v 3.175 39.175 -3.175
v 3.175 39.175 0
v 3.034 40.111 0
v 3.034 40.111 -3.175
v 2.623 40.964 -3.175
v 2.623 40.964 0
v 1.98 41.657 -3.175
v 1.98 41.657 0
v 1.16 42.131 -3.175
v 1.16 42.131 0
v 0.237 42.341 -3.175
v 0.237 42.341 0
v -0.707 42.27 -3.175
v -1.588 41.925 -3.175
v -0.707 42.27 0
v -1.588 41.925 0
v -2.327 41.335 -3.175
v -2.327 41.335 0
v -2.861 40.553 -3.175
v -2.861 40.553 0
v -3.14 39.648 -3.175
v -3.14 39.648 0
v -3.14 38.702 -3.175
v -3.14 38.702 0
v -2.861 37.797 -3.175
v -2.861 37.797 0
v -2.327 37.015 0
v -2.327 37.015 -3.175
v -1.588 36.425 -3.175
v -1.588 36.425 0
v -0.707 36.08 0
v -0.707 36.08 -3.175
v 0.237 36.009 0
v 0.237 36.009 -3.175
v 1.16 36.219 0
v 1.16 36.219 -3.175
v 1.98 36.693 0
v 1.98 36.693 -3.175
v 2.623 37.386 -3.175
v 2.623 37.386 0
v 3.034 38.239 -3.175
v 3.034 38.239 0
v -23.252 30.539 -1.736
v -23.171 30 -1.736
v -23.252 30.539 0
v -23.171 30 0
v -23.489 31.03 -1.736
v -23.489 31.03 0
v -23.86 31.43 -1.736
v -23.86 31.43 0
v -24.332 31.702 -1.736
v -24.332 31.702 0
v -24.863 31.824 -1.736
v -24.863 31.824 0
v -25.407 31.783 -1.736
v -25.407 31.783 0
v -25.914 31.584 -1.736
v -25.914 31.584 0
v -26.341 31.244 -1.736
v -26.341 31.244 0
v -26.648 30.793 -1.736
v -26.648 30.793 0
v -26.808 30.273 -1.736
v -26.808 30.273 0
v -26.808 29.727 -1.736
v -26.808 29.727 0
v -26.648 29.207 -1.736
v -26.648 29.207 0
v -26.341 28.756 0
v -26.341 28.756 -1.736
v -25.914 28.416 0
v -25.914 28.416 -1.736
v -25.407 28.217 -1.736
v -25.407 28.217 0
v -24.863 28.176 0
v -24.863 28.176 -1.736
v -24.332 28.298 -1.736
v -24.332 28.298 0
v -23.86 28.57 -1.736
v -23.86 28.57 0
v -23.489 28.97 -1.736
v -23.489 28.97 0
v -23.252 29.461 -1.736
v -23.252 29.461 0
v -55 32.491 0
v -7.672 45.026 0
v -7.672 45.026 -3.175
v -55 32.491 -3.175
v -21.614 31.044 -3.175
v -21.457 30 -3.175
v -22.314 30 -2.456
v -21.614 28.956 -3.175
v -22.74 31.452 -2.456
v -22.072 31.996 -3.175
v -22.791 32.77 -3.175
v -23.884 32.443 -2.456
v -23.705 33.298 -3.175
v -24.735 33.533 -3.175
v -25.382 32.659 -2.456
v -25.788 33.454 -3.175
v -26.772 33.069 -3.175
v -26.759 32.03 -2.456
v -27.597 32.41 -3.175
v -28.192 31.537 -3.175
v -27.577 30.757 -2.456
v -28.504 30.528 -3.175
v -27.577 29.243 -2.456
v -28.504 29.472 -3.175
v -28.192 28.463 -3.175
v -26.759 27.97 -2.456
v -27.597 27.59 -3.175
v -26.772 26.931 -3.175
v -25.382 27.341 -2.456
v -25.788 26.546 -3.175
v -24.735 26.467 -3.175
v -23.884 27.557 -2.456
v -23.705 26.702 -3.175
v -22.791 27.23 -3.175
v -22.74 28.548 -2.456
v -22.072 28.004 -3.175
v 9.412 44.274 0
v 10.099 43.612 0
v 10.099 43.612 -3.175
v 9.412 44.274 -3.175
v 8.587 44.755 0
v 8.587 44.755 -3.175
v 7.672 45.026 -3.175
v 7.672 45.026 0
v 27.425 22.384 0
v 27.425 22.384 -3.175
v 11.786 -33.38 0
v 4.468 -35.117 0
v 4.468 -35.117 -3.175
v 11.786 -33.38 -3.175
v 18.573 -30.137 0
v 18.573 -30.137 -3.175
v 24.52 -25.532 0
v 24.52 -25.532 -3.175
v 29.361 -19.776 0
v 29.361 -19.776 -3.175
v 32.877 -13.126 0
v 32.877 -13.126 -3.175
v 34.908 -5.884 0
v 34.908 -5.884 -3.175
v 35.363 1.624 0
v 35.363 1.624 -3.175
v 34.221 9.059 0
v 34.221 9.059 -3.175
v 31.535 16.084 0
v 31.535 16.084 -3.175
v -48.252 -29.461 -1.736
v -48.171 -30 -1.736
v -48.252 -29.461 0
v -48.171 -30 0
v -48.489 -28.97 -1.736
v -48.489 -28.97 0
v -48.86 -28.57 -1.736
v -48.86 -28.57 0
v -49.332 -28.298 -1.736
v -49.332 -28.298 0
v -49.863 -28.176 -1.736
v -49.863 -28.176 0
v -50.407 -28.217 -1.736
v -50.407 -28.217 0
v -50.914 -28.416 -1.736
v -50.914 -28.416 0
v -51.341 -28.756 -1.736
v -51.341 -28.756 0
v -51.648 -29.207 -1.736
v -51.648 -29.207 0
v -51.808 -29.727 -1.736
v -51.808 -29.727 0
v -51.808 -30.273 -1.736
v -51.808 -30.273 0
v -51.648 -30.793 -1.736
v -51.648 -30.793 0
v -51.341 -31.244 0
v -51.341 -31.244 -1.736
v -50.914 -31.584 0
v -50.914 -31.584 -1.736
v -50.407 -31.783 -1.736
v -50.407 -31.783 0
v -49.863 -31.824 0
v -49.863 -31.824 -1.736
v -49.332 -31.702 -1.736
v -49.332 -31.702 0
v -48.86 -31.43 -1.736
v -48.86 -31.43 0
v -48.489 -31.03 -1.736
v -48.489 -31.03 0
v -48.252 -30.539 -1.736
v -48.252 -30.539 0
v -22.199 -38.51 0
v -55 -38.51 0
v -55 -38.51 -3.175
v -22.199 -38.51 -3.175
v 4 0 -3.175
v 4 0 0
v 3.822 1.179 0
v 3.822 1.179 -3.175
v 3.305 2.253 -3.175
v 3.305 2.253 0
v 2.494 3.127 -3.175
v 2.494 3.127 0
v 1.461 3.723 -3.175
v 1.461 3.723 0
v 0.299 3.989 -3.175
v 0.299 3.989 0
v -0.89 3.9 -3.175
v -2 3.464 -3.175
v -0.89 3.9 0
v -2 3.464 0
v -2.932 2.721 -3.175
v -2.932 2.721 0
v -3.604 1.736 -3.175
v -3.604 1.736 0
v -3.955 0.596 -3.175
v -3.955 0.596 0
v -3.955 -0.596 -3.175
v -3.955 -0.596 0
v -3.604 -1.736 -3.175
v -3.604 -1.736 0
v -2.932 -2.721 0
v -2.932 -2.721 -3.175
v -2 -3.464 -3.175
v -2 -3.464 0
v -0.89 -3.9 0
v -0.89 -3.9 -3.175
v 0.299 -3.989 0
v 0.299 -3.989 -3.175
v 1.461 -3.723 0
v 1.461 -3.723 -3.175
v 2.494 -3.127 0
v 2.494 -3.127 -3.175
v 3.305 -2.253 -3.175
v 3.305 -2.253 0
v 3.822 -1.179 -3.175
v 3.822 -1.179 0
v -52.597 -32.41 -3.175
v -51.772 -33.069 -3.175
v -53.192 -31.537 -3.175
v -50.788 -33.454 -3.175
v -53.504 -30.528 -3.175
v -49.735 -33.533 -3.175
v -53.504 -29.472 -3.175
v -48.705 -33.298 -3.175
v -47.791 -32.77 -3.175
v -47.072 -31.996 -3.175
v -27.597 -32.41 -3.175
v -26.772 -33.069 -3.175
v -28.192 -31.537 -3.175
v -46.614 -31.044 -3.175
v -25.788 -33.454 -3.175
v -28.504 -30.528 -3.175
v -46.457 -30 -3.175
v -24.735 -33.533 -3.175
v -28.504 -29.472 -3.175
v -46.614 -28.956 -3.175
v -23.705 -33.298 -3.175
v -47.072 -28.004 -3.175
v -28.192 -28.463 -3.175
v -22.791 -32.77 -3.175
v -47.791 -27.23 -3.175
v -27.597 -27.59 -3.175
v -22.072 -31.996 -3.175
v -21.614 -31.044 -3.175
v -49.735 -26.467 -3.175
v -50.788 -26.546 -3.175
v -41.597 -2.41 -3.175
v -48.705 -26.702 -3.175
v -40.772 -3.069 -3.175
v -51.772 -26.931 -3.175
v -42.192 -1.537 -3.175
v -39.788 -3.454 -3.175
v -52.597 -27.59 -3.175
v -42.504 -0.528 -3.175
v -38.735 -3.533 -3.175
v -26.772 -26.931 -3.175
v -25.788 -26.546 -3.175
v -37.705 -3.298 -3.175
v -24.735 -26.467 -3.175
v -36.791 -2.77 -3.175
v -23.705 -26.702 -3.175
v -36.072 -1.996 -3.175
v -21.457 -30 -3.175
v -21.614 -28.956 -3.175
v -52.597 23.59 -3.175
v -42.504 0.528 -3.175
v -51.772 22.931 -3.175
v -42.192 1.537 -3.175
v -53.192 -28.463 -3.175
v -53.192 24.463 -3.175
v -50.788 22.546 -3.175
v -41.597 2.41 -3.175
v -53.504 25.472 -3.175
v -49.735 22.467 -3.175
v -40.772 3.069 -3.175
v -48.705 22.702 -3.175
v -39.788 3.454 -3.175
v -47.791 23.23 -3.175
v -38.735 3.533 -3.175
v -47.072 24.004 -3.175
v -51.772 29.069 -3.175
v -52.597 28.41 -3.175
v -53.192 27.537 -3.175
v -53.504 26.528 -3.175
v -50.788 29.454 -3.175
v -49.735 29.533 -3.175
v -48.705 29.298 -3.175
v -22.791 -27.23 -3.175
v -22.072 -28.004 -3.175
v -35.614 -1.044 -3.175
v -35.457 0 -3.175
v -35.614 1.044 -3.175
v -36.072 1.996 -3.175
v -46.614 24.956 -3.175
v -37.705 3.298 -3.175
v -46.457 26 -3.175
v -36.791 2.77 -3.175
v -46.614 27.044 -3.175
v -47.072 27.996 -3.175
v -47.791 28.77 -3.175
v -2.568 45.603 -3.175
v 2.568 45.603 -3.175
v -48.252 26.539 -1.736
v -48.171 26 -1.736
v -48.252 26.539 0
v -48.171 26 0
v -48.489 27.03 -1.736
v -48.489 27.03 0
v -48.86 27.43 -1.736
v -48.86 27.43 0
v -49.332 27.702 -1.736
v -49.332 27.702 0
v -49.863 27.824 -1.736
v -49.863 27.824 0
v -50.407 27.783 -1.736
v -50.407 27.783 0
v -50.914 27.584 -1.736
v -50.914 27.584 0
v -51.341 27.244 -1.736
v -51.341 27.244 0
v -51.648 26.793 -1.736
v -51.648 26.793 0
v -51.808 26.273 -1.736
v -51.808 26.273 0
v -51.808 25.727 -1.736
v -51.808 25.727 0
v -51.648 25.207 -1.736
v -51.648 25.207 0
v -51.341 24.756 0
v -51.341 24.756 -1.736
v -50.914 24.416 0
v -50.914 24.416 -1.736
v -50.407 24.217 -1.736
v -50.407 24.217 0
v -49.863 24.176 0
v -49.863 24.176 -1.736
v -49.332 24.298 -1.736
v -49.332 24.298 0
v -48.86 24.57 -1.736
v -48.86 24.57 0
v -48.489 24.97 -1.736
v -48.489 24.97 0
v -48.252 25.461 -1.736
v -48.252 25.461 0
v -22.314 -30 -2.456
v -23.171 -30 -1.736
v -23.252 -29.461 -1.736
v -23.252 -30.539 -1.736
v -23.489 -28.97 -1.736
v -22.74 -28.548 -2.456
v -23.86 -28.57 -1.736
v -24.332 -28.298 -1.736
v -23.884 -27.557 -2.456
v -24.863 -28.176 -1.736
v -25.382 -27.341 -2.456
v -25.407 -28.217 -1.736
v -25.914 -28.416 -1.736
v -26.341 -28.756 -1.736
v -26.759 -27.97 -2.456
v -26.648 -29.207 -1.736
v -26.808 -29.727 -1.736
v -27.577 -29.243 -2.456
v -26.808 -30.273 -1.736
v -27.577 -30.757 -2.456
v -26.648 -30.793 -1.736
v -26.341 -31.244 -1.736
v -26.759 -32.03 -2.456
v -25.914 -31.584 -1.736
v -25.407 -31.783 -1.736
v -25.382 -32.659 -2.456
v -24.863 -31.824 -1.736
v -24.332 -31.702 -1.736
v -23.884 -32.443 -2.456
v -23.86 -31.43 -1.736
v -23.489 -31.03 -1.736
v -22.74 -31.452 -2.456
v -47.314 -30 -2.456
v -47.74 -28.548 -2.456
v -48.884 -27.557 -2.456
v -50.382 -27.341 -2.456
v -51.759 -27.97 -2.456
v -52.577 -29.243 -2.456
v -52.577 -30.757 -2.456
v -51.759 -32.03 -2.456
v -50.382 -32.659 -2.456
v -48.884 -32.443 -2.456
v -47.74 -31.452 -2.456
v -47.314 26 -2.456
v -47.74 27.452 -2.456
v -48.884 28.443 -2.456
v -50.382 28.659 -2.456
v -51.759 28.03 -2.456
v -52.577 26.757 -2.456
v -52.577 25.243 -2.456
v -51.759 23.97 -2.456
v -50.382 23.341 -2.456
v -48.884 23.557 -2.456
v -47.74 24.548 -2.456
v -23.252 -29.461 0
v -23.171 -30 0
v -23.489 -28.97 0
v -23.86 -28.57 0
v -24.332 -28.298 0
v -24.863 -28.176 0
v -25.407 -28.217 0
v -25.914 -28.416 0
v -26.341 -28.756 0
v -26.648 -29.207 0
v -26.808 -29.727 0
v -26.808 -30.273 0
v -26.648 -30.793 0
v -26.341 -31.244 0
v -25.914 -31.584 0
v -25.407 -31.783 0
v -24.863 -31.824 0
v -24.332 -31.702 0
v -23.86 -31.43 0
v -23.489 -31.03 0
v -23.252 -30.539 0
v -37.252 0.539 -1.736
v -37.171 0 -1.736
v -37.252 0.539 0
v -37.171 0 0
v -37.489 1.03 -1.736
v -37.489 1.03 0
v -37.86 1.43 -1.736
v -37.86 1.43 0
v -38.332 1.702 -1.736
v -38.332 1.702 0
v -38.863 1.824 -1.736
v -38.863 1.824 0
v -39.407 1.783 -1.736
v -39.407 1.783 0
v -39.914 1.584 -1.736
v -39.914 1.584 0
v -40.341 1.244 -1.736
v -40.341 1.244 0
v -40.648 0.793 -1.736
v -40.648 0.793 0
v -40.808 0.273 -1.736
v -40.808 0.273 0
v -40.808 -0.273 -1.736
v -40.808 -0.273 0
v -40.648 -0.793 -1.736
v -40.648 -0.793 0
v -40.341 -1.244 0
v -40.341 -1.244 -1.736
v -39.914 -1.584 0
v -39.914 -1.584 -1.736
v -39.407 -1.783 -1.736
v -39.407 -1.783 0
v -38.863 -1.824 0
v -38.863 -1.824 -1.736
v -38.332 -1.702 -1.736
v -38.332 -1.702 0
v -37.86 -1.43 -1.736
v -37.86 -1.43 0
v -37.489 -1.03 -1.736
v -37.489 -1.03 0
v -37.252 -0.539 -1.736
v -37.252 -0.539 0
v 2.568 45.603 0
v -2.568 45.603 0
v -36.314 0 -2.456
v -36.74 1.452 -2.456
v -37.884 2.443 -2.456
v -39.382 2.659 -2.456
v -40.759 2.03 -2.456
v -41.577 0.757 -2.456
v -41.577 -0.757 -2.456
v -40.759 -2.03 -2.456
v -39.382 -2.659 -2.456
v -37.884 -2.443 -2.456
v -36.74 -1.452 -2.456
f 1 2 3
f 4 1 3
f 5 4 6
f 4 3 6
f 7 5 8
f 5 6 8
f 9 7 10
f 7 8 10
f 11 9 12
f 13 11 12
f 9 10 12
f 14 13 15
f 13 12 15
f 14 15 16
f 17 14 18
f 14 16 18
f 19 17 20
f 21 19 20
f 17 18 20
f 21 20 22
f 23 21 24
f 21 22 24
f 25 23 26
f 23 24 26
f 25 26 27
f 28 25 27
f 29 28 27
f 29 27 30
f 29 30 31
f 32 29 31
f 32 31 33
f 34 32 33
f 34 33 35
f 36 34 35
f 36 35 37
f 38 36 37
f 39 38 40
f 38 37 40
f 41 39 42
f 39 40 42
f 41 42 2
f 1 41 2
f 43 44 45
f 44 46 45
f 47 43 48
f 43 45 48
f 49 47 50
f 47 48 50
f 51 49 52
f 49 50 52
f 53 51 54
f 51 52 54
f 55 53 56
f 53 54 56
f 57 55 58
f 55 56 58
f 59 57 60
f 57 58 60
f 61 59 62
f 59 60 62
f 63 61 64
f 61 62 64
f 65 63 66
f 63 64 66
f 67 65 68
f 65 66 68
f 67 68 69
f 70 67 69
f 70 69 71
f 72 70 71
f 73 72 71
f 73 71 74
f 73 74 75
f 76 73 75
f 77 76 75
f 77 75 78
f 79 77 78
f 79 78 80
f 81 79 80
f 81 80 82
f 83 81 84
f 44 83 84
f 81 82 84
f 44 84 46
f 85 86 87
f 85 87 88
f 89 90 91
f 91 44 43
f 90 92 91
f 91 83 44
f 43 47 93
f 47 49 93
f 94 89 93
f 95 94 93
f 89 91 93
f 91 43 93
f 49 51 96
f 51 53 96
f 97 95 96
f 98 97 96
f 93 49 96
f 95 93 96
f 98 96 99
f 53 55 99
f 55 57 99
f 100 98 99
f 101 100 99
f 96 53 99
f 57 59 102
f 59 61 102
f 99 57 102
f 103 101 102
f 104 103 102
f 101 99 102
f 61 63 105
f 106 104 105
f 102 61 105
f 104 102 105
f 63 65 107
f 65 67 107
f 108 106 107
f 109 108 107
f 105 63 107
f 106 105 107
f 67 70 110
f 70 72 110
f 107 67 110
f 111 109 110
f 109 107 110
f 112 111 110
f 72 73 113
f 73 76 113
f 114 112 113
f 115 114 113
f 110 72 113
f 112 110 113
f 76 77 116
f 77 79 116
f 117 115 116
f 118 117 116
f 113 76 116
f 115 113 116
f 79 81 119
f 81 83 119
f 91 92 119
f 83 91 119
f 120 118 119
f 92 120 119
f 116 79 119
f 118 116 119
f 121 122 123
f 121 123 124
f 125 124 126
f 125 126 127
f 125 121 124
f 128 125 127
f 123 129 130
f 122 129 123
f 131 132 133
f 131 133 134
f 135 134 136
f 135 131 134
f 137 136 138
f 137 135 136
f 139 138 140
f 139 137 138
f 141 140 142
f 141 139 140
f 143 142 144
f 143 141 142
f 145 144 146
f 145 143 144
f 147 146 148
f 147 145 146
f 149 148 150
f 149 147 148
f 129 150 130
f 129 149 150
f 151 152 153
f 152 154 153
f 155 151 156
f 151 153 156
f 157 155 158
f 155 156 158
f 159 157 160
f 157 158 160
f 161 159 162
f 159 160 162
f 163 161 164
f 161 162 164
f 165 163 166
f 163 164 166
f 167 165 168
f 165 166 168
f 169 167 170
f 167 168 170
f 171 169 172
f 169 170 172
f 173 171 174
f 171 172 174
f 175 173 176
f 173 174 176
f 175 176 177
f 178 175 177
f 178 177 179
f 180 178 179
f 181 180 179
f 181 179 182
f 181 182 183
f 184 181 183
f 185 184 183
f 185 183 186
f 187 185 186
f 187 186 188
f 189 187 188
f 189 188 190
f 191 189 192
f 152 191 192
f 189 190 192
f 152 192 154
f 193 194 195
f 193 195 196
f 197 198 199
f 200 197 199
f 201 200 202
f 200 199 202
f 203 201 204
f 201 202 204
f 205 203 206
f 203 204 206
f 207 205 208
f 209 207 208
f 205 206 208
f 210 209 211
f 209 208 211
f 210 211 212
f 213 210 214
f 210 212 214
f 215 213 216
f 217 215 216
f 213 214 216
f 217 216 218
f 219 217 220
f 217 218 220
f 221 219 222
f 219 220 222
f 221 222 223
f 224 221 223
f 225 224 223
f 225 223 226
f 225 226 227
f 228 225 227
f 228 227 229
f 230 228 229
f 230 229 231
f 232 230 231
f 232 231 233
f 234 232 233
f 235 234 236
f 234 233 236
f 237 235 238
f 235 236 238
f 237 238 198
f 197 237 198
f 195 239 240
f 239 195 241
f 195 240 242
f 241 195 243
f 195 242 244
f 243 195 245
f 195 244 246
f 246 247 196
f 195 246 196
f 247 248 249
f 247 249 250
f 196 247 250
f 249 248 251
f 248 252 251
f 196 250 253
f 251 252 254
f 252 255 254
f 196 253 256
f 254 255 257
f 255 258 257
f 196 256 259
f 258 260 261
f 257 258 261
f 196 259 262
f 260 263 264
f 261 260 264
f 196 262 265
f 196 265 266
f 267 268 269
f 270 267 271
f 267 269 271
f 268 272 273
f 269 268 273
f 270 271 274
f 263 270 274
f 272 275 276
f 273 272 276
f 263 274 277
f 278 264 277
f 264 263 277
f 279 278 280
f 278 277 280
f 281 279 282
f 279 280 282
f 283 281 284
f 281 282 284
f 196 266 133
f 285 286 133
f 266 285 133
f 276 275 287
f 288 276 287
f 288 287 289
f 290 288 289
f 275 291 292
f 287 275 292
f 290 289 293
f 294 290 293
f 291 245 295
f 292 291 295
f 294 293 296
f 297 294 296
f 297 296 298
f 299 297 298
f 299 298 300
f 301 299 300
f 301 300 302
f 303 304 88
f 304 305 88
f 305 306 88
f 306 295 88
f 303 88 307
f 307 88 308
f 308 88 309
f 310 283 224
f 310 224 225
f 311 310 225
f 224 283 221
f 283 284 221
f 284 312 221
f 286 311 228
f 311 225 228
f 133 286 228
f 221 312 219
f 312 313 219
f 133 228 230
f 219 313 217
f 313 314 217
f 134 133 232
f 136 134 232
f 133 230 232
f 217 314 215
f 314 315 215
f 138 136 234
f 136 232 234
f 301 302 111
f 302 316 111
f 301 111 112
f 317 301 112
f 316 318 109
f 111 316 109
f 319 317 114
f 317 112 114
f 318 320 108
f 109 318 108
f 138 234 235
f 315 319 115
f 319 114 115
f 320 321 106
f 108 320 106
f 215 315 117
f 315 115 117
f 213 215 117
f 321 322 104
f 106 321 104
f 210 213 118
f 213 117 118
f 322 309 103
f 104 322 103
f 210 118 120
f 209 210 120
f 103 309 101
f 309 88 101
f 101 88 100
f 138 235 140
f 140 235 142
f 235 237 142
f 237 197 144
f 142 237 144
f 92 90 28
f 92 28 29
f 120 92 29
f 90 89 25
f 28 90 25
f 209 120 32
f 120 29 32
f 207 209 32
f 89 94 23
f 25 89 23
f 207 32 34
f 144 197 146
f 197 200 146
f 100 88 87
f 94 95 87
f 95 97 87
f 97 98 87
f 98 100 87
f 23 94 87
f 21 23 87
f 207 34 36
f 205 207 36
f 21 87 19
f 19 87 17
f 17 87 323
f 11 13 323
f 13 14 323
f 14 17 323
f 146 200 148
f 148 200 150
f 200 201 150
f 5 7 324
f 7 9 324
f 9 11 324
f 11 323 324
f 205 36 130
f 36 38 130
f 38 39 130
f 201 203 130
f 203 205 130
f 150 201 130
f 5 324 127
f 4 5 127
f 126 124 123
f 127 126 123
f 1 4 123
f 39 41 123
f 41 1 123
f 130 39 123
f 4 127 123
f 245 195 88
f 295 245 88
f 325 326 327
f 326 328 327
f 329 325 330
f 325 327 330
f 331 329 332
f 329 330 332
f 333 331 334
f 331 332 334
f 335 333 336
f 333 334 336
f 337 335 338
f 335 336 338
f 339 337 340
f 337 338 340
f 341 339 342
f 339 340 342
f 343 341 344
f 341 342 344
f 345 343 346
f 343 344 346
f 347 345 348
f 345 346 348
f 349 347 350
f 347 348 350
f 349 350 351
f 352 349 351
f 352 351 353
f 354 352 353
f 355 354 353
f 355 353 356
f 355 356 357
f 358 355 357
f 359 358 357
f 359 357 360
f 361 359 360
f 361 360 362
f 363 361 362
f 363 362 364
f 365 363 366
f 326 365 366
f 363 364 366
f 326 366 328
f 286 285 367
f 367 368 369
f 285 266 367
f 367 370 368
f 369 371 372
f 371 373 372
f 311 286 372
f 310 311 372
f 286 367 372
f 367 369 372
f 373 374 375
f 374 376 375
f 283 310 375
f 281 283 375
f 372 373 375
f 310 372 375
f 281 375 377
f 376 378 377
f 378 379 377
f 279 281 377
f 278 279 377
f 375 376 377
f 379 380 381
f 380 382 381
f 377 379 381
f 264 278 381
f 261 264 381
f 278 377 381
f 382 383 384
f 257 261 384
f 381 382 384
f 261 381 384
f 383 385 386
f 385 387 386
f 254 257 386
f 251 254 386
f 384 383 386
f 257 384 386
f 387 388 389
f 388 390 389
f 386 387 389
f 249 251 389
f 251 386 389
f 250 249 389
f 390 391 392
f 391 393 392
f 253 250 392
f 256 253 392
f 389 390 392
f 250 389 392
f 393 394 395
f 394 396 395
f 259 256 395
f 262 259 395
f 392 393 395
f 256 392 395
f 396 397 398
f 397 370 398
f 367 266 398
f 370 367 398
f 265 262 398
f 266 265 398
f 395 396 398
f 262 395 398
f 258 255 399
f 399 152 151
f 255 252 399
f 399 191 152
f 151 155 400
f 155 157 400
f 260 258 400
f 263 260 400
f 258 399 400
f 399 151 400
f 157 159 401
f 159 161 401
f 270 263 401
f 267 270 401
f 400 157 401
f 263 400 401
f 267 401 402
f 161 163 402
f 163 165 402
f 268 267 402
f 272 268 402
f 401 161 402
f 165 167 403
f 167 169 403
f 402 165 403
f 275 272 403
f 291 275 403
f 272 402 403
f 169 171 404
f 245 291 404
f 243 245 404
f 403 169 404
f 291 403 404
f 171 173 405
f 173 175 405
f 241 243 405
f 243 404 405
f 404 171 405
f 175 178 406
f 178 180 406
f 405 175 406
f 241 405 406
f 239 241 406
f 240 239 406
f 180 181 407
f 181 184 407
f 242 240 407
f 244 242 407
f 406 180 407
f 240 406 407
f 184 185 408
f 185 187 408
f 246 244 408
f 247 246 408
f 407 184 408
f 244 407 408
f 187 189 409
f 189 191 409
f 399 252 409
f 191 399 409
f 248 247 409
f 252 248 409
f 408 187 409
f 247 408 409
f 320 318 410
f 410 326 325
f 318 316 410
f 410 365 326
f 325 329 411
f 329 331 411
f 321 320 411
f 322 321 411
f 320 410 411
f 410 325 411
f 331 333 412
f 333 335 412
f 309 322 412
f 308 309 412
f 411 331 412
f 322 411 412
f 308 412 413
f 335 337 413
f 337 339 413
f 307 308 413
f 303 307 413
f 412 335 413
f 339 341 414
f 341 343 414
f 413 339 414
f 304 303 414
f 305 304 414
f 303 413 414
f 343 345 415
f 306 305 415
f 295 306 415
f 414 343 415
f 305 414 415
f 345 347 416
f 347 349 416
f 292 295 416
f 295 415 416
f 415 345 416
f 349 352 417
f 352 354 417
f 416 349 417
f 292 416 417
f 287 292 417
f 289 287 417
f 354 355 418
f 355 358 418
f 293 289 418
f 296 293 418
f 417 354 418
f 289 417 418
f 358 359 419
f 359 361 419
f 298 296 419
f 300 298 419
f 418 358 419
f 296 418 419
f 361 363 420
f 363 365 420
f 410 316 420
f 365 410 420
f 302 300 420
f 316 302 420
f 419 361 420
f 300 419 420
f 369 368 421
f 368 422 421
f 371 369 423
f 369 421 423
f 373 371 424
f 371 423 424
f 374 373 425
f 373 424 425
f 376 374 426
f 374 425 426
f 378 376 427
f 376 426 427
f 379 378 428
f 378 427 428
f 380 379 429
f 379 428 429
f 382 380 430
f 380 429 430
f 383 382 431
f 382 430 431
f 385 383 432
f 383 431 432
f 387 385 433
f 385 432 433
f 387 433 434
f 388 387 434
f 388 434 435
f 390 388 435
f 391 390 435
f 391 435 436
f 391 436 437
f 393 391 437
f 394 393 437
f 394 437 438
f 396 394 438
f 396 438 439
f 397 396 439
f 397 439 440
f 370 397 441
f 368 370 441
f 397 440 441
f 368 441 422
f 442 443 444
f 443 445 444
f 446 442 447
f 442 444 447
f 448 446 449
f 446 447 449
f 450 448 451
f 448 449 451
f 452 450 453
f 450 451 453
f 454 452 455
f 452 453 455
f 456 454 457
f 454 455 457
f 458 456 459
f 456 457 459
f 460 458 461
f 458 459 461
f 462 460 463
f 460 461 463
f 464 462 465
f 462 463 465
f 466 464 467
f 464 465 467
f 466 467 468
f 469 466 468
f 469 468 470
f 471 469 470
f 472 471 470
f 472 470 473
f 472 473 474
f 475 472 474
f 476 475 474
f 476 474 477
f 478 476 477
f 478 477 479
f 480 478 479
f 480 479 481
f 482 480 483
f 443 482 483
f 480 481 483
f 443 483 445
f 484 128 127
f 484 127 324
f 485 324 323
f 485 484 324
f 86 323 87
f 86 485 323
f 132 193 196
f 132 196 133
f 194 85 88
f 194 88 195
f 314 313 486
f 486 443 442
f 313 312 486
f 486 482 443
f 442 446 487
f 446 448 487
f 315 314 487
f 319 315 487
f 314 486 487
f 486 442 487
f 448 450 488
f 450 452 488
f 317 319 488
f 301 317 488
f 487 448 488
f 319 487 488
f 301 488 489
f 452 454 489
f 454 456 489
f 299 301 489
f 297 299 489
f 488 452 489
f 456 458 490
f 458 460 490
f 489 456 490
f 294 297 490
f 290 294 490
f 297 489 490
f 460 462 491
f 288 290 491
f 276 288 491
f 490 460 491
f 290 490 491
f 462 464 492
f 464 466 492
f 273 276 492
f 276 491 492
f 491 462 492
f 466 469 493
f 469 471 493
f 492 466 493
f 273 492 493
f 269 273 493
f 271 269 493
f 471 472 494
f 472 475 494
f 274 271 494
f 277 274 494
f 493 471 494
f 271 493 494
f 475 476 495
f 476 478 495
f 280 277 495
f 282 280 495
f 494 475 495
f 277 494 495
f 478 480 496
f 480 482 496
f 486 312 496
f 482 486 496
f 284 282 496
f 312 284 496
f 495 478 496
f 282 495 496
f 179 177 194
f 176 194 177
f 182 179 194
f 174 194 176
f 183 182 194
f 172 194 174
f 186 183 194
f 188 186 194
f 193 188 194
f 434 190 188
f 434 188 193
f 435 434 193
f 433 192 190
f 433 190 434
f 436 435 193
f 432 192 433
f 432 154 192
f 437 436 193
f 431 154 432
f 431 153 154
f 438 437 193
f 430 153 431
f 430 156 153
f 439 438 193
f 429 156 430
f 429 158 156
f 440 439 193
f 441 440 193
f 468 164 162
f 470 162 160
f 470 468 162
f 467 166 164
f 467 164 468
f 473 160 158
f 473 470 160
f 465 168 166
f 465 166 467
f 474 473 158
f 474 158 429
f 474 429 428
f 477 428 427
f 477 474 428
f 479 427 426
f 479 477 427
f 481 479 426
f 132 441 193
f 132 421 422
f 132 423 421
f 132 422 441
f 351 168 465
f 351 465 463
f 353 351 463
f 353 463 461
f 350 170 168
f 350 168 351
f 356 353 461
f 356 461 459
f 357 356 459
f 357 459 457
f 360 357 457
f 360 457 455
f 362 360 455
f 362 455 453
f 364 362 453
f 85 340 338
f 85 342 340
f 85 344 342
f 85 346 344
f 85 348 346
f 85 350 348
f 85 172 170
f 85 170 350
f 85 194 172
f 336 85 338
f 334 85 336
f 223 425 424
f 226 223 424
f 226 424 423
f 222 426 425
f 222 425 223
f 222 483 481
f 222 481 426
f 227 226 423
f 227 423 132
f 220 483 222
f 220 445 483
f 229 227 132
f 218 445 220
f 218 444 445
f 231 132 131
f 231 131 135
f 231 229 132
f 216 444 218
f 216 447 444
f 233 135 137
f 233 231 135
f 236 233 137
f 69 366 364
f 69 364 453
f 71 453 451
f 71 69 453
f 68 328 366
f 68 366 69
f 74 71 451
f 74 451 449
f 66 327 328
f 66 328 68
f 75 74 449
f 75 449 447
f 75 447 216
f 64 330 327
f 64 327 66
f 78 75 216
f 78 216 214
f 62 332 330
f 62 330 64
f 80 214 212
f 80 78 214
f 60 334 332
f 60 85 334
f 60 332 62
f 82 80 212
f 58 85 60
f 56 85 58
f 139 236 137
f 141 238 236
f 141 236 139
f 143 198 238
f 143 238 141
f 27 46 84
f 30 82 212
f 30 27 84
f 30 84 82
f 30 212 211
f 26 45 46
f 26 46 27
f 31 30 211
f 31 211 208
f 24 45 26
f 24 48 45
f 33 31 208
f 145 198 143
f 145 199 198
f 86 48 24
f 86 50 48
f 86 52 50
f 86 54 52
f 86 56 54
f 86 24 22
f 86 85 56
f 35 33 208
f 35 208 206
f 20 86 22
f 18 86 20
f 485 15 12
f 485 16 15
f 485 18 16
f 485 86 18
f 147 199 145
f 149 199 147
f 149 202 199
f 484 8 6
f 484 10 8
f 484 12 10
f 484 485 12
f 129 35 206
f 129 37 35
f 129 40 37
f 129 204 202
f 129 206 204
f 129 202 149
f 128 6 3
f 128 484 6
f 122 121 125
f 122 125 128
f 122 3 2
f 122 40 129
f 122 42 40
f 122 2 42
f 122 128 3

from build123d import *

# Parameters (mm, degrees)
SKETCH1_R                                         = 3.175
SKETCH1_R_2                                       = 4
BOSS_EXTRUDE1_DEPTH                               = 3.175
CSK_FOR_6_FLAT_HEAD_MACHINE_SCREW_100_D           = 3.6576
CSK_FOR_6_FLAT_HEAD_MACHINE_SCREW_100_DEPTH       = 8
CSK_FOR_6_FLAT_HEAD_MACHINE_SCREW_100_CSINK_D     = 7.0866
CSK_FOR_6_FLAT_HEAD_MACHINE_SCREW_100_CSINK_ANGLE = 100
CSK_FOR_6_FLAT_HEAD_MACHINE_SCREW_100_TIP         = 1.0988539


with BuildPart() as part:
    # Sketch1 → Boss-Extrude1 (new body)
    with BuildSketch(Plane.XY):
        with BuildLine():
            Line((-55, -38.509768834), (-22.199103684, -38.509768834))
            Line((-22.199103684, -38.509768834), (4.467936384, -35.116912513))
            ThreePointArc((4.467936384, -35.116912513), (32.876567079, -13.125979473), (27.425045484, 22.383629737))
            Line((27.425045484, 22.383629737), (10.098875196, 43.612135293))
            ThreePointArc((10.098875196, 43.612135293), (9.013562327, 44.539147516), (7.671865627, 45.026082472))
            ThreePointArc((7.671865627, 45.026082472), (0, 45.675), (-7.671865627, 45.026082472))
            Line((-7.671865627, 45.026082472), (-55, 32.491174512))
            Line((-55, 32.491174512), (-55, -38.509768834))
        make_face()
        with Locations((0, 39.175)):
            Circle(SKETCH1_R, mode=Mode.SUBTRACT)
        Circle(SKETCH1_R_2, mode=Mode.SUBTRACT)
    extrude(amount=-BOSS_EXTRUDE1_DEPTH)

    # CSK for #6 Flat Head Machine Screw (100)1
    with Locations(Plane(origin=(0, 0, -3.175), x_dir=(-1, 0, 0), z_dir=(0, 0, -1))):
        with Locations((50, 26), (39, 0), (50, -30), (25, 30), (25, -30)):
            CounterSinkHole(CSK_FOR_6_FLAT_HEAD_MACHINE_SCREW_100_D / 2, CSK_FOR_6_FLAT_HEAD_MACHINE_SCREW_100_CSINK_D / 2, depth=CSK_FOR_6_FLAT_HEAD_MACHINE_SCREW_100_DEPTH, counter_sink_angle=CSK_FOR_6_FLAT_HEAD_MACHINE_SCREW_100_CSINK_ANGLE)
            with Locations((0, 0, -(CSK_FOR_6_FLAT_HEAD_MACHINE_SCREW_100_DEPTH + CSK_FOR_6_FLAT_HEAD_MACHINE_SCREW_100_TIP / 2))):  # 118° drill point
                Cone(0, CSK_FOR_6_FLAT_HEAD_MACHINE_SCREW_100_D / 2, CSK_FOR_6_FLAT_HEAD_MACHINE_SCREW_100_TIP, mode=Mode.SUBTRACT)


solid = part.part
